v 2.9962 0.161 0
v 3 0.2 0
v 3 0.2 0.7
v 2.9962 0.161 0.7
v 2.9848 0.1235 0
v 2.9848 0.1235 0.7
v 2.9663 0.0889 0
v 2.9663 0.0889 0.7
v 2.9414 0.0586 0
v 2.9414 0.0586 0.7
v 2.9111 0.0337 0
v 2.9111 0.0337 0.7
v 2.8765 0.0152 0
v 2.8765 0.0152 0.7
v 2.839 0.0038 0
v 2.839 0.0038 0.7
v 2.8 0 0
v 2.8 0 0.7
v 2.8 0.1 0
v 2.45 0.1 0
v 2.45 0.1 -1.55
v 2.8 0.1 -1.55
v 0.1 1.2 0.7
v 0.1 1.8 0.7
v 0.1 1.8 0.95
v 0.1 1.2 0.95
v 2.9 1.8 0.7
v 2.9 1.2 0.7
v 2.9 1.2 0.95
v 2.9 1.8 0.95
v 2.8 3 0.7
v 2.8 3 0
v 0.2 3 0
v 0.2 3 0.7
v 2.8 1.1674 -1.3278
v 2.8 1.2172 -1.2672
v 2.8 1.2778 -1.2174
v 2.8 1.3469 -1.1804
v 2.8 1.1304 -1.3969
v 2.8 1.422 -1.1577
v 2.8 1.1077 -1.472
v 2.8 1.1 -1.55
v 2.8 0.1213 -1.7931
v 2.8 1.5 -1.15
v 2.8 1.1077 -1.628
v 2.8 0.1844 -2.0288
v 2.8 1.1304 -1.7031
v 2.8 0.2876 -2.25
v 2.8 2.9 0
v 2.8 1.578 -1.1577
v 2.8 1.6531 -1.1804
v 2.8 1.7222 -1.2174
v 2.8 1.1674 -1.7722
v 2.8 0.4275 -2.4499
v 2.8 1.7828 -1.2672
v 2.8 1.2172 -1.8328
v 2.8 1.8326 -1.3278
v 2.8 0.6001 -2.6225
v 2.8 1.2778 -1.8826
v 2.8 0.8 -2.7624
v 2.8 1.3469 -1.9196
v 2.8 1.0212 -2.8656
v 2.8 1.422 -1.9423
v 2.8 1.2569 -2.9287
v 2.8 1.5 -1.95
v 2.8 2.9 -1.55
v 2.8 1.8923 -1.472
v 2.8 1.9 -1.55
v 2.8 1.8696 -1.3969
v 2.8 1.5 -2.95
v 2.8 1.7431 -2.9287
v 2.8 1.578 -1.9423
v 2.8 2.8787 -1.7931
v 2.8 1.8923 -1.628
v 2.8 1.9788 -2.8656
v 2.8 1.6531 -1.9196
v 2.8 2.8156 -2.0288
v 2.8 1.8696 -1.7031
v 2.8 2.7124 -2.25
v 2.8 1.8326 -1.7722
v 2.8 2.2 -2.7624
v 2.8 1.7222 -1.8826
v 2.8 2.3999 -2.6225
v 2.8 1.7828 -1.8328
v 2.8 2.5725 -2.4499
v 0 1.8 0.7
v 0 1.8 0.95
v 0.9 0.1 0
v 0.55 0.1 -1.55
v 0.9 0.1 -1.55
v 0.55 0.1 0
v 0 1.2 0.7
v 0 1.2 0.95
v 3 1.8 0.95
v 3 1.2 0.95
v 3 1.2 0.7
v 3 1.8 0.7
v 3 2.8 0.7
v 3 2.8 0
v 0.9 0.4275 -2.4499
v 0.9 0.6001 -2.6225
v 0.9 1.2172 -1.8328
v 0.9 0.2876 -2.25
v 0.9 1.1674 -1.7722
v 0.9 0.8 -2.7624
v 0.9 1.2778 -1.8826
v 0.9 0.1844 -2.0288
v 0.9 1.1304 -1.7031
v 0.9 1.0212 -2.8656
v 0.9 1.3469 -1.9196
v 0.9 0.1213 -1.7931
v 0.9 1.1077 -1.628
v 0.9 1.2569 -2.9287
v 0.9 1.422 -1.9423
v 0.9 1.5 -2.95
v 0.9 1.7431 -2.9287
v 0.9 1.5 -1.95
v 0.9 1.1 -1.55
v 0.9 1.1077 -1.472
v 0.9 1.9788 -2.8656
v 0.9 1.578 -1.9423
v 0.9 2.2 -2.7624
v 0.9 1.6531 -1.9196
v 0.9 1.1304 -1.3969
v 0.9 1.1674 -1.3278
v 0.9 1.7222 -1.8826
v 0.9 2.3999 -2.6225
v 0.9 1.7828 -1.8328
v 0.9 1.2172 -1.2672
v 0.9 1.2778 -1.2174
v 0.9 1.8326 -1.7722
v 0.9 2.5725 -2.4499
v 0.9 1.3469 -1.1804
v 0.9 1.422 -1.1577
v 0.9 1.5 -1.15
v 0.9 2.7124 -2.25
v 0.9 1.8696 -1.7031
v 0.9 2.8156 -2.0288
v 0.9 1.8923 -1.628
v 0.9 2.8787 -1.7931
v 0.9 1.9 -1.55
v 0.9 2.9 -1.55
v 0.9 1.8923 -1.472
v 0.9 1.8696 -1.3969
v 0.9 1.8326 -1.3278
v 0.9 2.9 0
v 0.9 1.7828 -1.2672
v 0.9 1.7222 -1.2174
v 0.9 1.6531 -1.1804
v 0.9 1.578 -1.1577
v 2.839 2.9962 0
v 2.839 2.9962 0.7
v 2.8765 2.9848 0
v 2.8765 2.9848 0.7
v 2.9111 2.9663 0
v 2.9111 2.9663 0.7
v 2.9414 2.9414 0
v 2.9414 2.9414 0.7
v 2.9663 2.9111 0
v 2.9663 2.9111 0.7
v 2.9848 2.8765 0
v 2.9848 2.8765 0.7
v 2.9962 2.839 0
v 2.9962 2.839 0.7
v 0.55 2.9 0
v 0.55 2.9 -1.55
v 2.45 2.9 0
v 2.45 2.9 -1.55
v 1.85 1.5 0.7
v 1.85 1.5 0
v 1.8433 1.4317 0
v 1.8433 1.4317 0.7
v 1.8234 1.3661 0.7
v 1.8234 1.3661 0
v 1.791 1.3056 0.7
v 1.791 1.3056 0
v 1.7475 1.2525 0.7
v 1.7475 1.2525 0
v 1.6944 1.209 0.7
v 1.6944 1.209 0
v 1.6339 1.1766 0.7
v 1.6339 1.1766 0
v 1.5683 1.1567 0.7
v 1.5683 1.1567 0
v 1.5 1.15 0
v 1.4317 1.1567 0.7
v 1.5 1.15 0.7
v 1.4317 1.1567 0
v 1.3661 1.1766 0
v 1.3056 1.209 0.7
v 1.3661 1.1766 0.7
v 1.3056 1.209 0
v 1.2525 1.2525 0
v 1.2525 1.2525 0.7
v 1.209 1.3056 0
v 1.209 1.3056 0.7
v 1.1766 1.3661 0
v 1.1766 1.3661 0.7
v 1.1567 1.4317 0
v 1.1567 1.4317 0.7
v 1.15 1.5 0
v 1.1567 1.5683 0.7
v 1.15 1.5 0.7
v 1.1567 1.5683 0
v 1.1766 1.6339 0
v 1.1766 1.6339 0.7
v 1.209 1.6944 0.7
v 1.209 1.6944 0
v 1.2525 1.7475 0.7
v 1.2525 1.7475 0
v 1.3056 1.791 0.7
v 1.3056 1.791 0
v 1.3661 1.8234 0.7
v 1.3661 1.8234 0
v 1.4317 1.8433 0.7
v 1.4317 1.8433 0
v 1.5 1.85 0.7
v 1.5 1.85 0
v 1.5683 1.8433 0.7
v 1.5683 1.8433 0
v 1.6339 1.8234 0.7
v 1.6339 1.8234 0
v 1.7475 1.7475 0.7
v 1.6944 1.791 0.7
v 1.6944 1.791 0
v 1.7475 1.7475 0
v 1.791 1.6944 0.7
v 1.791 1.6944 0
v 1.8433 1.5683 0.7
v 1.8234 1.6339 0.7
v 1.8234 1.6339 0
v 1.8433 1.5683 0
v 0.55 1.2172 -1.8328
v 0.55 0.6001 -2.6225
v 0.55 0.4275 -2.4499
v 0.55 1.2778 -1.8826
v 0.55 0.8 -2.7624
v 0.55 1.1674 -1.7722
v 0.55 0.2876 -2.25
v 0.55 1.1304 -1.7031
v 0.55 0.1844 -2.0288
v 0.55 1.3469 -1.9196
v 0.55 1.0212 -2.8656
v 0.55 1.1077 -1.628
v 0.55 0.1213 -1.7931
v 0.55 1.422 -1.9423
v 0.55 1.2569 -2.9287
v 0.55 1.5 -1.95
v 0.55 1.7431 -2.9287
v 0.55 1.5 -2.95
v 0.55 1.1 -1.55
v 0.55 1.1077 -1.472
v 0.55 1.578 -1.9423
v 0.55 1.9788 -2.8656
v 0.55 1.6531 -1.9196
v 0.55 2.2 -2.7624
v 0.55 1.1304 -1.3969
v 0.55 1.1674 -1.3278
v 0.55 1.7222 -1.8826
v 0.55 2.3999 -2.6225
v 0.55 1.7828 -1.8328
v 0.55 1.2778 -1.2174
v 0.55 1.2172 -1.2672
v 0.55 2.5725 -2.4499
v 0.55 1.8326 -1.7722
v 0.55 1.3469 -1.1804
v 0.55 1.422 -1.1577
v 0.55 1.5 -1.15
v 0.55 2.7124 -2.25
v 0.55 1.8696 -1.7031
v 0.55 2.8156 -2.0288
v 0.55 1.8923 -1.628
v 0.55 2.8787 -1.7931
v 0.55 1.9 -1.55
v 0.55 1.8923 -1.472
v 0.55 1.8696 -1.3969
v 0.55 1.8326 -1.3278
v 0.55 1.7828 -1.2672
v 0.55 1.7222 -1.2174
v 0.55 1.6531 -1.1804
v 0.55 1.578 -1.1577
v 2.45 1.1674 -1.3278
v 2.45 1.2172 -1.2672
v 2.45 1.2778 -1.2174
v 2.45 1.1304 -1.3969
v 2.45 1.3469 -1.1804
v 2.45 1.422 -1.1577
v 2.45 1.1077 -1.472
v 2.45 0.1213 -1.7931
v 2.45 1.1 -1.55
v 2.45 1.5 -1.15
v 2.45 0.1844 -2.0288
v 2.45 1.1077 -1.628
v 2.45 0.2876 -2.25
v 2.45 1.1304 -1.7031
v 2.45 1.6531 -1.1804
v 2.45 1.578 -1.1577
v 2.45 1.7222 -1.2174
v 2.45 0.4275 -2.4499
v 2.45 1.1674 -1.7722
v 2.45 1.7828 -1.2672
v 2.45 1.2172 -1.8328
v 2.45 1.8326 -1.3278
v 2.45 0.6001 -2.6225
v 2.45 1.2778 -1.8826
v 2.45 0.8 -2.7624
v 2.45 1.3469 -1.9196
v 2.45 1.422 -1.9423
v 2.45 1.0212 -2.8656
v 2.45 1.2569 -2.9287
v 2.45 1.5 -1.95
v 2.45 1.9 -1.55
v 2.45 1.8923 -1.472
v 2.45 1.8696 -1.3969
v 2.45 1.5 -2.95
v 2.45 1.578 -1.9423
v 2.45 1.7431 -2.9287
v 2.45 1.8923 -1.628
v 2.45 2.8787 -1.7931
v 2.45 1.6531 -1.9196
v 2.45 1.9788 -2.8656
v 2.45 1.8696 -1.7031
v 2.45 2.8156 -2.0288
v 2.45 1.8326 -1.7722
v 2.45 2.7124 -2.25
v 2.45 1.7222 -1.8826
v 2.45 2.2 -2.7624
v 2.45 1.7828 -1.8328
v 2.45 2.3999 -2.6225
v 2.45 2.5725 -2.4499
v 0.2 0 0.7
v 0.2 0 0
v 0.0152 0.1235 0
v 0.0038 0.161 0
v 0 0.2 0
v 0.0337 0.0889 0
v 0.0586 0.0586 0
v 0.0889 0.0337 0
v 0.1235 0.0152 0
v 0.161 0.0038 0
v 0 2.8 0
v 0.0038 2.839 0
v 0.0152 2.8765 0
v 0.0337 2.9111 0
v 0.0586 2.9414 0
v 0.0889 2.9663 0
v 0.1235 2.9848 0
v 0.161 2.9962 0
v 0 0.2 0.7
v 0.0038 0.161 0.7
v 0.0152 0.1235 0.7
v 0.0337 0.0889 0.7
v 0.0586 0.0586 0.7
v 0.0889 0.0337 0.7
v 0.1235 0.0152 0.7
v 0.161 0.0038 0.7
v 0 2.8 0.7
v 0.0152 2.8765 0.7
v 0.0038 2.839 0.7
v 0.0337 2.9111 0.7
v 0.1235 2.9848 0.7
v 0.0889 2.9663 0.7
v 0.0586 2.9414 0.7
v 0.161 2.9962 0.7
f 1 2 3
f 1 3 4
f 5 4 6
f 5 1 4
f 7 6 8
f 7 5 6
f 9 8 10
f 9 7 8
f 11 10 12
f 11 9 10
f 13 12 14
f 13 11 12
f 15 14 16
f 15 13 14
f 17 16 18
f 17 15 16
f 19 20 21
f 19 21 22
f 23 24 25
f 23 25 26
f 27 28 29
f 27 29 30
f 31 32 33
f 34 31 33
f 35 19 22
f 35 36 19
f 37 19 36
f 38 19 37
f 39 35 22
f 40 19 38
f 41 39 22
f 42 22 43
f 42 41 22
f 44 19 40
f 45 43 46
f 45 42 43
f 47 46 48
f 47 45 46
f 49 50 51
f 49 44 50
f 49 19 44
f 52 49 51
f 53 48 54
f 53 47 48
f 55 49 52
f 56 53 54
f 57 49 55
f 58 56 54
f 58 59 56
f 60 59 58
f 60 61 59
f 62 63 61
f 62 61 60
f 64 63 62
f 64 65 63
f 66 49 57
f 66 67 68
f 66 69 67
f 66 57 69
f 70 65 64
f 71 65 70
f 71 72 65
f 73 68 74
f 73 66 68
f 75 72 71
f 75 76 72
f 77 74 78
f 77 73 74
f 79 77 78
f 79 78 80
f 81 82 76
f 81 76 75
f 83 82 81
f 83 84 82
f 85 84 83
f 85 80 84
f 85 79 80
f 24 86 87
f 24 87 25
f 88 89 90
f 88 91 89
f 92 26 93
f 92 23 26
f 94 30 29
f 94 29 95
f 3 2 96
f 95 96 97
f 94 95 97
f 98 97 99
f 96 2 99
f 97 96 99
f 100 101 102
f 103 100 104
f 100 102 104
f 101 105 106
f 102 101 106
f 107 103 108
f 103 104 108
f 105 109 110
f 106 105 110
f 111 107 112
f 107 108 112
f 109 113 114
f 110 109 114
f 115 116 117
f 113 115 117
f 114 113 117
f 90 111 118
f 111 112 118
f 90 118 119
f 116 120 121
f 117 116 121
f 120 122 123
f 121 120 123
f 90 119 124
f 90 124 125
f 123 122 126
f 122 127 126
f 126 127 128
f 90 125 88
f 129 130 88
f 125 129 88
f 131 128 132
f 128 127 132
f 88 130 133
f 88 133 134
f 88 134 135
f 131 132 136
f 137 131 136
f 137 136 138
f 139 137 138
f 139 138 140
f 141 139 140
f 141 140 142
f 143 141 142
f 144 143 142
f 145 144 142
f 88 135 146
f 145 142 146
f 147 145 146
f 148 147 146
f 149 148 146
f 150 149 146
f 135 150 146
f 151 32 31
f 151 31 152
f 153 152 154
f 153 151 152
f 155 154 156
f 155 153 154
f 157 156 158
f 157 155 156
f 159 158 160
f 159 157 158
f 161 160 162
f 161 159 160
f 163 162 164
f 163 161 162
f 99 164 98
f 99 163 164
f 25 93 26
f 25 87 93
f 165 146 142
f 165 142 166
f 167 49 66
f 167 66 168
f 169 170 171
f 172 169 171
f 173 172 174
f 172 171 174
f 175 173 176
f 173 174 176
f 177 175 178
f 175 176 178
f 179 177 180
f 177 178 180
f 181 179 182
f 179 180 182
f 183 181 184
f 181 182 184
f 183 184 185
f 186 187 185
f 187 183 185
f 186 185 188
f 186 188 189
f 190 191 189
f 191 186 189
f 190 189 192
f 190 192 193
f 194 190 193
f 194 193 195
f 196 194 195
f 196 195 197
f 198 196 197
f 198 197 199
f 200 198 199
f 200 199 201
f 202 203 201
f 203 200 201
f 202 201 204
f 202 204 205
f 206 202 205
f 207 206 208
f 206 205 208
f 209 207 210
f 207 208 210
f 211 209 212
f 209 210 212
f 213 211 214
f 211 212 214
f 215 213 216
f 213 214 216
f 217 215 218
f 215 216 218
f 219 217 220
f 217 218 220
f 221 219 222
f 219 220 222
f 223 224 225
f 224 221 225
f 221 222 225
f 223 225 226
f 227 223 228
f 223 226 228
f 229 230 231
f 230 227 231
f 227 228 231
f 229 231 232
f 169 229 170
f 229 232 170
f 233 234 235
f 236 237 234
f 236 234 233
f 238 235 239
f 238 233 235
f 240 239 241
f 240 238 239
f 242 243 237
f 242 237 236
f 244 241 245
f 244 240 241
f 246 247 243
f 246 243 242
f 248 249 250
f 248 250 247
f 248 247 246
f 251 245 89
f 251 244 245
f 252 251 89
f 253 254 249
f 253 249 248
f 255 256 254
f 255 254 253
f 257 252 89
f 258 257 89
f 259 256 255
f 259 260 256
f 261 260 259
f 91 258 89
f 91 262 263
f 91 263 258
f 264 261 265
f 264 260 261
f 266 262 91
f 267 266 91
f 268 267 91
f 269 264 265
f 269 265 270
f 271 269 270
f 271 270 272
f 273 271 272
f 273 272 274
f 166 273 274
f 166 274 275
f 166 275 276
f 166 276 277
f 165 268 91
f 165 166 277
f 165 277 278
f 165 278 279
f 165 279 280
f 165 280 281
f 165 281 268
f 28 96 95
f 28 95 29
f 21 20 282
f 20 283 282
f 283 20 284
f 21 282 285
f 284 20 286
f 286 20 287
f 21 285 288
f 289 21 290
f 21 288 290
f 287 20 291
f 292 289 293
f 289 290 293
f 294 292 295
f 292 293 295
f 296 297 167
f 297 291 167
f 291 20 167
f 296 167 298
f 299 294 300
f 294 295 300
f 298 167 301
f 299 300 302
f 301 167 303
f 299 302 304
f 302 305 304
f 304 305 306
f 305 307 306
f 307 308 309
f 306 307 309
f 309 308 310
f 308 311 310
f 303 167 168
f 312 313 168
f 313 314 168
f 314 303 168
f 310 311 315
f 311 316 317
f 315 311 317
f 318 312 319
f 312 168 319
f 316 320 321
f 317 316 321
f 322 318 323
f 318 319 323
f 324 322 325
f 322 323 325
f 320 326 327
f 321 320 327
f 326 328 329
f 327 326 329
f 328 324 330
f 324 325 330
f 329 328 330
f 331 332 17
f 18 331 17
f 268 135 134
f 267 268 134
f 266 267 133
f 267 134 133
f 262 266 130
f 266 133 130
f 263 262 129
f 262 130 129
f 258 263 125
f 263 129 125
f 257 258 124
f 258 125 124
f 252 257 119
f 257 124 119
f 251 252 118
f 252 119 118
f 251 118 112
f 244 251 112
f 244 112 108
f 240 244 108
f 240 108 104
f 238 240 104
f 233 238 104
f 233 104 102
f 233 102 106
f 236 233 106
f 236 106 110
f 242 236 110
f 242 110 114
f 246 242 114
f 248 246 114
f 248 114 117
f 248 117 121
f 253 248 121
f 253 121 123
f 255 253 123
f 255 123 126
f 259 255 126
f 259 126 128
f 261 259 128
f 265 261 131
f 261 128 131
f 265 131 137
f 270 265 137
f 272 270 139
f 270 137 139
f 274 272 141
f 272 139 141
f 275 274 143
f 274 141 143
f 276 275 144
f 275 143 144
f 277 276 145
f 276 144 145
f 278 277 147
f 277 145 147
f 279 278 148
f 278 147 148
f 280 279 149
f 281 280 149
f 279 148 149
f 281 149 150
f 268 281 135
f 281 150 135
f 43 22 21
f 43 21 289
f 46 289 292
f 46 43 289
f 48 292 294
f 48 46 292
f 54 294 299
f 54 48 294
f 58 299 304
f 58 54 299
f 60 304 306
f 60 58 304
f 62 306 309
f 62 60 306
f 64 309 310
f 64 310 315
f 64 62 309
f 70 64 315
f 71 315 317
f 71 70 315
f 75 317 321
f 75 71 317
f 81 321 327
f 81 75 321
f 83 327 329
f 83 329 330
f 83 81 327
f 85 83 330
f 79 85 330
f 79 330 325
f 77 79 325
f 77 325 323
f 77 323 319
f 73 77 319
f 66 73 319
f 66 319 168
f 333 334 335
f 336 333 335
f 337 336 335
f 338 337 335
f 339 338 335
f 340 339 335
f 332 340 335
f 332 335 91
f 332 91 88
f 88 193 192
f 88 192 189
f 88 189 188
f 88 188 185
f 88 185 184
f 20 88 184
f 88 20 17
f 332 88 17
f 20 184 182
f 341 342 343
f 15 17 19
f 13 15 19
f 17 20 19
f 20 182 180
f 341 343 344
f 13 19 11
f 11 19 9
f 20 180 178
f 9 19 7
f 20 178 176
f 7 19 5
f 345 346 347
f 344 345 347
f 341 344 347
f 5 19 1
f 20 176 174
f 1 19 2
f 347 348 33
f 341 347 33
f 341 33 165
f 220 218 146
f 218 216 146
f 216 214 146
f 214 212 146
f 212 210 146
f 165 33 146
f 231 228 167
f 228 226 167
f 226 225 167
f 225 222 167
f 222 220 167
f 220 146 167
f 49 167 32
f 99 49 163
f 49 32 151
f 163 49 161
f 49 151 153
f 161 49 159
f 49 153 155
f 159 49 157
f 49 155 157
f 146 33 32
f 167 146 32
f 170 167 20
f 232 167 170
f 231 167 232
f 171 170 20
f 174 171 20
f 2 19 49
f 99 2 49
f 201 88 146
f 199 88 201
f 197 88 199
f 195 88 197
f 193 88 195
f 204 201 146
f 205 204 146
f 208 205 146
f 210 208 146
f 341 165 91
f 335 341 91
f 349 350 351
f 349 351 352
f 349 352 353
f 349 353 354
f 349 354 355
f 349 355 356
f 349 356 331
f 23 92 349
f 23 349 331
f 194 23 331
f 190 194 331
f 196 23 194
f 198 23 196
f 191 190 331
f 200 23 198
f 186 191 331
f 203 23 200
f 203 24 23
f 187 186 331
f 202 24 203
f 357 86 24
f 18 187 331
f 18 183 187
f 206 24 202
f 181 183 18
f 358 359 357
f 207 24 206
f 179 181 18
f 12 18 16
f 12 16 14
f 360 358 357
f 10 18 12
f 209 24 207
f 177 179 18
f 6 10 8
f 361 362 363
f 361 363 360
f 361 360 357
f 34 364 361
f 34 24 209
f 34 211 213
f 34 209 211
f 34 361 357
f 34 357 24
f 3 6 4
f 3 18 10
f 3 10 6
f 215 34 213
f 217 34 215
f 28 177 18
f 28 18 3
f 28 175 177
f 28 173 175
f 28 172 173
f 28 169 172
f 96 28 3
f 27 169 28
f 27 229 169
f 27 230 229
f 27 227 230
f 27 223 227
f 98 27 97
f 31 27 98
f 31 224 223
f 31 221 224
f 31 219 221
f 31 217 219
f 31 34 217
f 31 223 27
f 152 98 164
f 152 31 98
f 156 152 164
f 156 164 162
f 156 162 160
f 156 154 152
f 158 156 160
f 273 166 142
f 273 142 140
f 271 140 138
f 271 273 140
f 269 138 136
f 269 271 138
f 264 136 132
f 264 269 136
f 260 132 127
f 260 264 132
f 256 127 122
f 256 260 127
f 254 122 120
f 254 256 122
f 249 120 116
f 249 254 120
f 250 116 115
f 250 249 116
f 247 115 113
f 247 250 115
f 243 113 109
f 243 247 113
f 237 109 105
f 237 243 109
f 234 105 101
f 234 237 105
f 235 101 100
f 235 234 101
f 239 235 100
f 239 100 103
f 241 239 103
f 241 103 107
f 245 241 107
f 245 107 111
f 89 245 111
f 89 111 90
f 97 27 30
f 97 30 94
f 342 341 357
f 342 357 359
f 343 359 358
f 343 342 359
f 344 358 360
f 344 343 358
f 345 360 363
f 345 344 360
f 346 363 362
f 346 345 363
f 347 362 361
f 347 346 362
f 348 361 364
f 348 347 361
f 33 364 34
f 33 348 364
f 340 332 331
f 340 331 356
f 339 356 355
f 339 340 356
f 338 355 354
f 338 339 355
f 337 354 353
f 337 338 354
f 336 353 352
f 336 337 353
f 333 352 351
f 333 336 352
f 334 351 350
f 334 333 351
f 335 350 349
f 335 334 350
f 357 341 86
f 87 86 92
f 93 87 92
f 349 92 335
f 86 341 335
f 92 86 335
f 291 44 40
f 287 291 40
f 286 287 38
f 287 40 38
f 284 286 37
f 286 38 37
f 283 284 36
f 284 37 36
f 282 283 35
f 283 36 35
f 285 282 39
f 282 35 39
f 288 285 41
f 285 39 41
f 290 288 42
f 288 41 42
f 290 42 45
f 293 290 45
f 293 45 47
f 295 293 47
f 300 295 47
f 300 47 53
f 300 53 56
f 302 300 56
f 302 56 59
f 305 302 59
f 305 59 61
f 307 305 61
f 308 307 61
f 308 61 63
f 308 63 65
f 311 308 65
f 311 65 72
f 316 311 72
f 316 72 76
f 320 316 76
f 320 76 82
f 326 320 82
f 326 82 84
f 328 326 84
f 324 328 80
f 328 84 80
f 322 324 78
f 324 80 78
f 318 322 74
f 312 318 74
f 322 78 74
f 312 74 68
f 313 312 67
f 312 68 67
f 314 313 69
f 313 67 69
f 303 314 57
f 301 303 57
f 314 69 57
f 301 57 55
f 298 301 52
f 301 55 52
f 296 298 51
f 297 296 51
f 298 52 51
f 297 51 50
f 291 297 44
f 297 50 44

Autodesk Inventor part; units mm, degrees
ref_plane "YZ Plane" through (0, 0, 0) normal (1, 0, 0) x (0, 1, 0)
ref_plane "XZ Plane" through (0, 0, 0) normal (0, 1, 0) x (-1, 0, 0)
ref_plane "XY Plane" through (0, 0, 0) normal (0, 0, 1) x (1, 0, 0)
sketch "Skizze1" plane through (0, 0, 0) normal (0, 0, 1) x (1, 0, 0)
  line L0 (0.2, 0) -> (2.8, 0)
  line L1 (3, 0.2) -> (3, 2.8)
  line L2 (2.8, 3) -> (0.2, 3)
  line L3 (0, 2.8) -> (0, 0.2)
  arc A0 (0.2, 3) -> (0, 2.8) centre (0.2, 2.8) ccw
  arc A1 (3, 2.8) -> (2.8, 3) centre (2.8, 2.8) ccw
  arc A2 (2.8, 0) -> (3, 0.2) centre (2.8, 0.2) ccw
  arc A3 (0, 0.2) -> (0.2, 0) centre (0.2, 0.2) ccw
  line L4 (0, 1.5) -> (3, 1.5) construction
  line L5 (1.5, 3) -> (1.5, 0) construction
  circle A4 centre (1.5, 1.5) radius 0.35
  point P0 (0, 0)
  point P1 (3, 3)
  point P2 (3, 0)
  point P3 (0, 3)
  dimension "d0" = 3
  dimension "d1" = 3
  dimension "d2" = 0.2
  dimension "d3" = 0.7
extrude "Extrusion1" add sketch "Skizze1" along normal blind 0.7
sketch "Skizze2" plane through (0, 0, 0.7) normal (0, 0, 1) x (1, 0, 0)
  circle A0 centre (1.5, 1.5) radius 0.35 construction
  line L0 (2.8, 3) -> (0.2, 3) construction
  arc A1 (0.2, 3) -> (0, 2.8) centre (0.2, 2.8) ccw construction
  line L1 (0, 2.8) -> (0, 0.2) construction
  arc A2 (0, 0.2) -> (0.2, 0) centre (0.2, 0.2) ccw construction
  line L2 (0.2, 0) -> (2.8, 0) construction
  arc A3 (2.8, 0) -> (3, 0.2) centre (2.8, 0.2) ccw construction
  line L3 (3, 0.2) -> (3, 2.8) construction
  arc A4 (3, 2.8) -> (2.8, 3) centre (2.8, 2.8) ccw construction
  line L4 (0, 2.8) -> (0, 0.2) projected
  line L5 (0, 1.8) -> (0.1, 1.8)
  line L6 (0.1, 1.8) -> (0.1, 1.2)
  line L7 (0.1, 1.2) -> (0, 1.2)
  line L8 (0, 1.2) -> (0, 1.8)
  line L9 (0.2, 0) -> (2.8, 0) projected
  line L10 (1.2, 0) -> (1.8, 0)
  line L11 (1.8, 0) -> (1.8, 0.1)
  line L12 (1.8, 0.1) -> (1.2, 0.1)
  line L13 (1.2, 0.1) -> (1.2, 0)
  line L14 (3, 0.2) -> (3, 2.8) projected
  line L15 (3, 1.2) -> (2.9, 1.2)
  line L16 (2.9, 1.2) -> (2.9, 1.8)
  line L17 (2.9, 1.8) -> (3, 1.8)
  line L18 (3, 1.8) -> (3, 1.2)
  line L19 (0.2, 3) -> (2.8, 3) projected
  line L20 (1.8, 3) -> (1.2, 3)
  line L21 (1.2, 3) -> (1.2, 2.9)
  line L22 (1.2, 2.9) -> (1.8, 2.9)
  line L23 (1.8, 2.9) -> (1.8, 3)
  point P0 (0, 0)
  point P1 (0, 1.5)
  point P2 (3, 1.5)
  dimension "d6" = 0.6
  dimension "d7" = 0.1
  dimension "d8" = 0.6
  dimension "d9" = 0.6
  dimension "d10" = 0.6
  dimension "d11" = 0.1
  dimension "d12" = 0.1
  dimension "d13" = 0.1
extrude "Extrusion2" add sketch "Skizze2" along normal blind 0.25 contours L5 L6 L7 L4 | L15 L16 L17 L14
sketch "Skizze3" plane through (0, 0, 0) normal (0, 0, -1) x (-1, 0, 0)
  circle A0 centre (-1.5, 1.5) radius 0.35 construction
  line L0 (-0.2, 3) -> (-2.8, 3) construction
  arc A1 (-2.8, 3) -> (-3, 2.8) centre (-2.8, 2.8) ccw construction
  line L1 (-3, 2.8) -> (-3, 0.2) construction
  arc A2 (-3, 0.2) -> (-2.8, 0) centre (-2.8, 0.2) ccw construction
  line L2 (-2.8, 0) -> (-0.2, 0) construction
  arc A3 (-0.2, 0) -> (0, 0.2) centre (-0.2, 0.2) ccw construction
  line L3 (0, 0.2) -> (0, 2.8) construction
  arc A4 (0, 2.8) -> (-0.2, 3) centre (-0.2, 2.8) ccw construction
  line L4 (-2.8, 2.9) -> (-2.45, 2.9)
  line L5 (-2.45, 2.9) -> (-2.45, 0.1)
  line L6 (-2.45, 0.1) -> (-2.8, 0.1)
  line L7 (-2.8, 0.1) -> (-2.8, 2.9)
  line L8 (-0.9, 2.9) -> (-0.55, 2.9)
  line L9 (-0.55, 2.9) -> (-0.55, 0.1)
  line L10 (-0.55, 0.1) -> (-0.9, 0.1)
  line L11 (-0.9, 0.1) -> (-0.9, 2.9)
  line L12 (-3, 1.5) -> (0, 1.5) construction
  point P0 (0, 0)
  point P1 (-2.8, 1.5)
  dimension "d16" = 0.35
  dimension "d17" = 0.35
  dimension "d18" = 2.8
  dimension "d19" = 0.2
  dimension "d20" = 0.55
extrude "Extrusion3" add sketch "Skizze3" along normal blind 1.55
sketch "Skizze4" plane through (2.8, 0.1, 0) normal (1, 0, 0) x (0, 0, -1)
  line L0 (1.55, 2.8) -> (1.55, 0) projected
  line L1 (1.55, 2.8) -> (1.55, 0) construction
  arc A0 (1.55, 0) -> (1.55, 2.8) centre (1.55, 1.4) ccw
  point P0 (0, -0.1)
extrude "Extrusion4" add sketch "Skizze4" against normal blind 0.35
sketch "Skizze5" plane through (0.55, 0.1, 0) normal (-1, 0, 0) x (0, 0, 1)
  line L0 (-1.55, 0) -> (-1.55, 2.8) projected
  arc A0 (-1.55, 2.8) -> (-1.55, 0) centre (-1.55, 1.4) ccw projected
  point P0 (0, -0.1)
extrude "Extrusion5" add sketch "Skizze5" against normal blind 0.35
sketch "Skizze6" plane through (0.55, 0.1, 0) normal (-1, 0, 0) x (0, 0, 1)
  arc A0 (-1.55, 2.8) -> (-1.55, 0) centre (-1.55, 1.4) ccw construction
  point P0 (0, -0.1)
hole "Bohrung1" at (0.55, 1.5, -1.55) direction (1, 0, 0) diameter 0.8 end through all
properties part number "item_gelenk_teil_quer"
